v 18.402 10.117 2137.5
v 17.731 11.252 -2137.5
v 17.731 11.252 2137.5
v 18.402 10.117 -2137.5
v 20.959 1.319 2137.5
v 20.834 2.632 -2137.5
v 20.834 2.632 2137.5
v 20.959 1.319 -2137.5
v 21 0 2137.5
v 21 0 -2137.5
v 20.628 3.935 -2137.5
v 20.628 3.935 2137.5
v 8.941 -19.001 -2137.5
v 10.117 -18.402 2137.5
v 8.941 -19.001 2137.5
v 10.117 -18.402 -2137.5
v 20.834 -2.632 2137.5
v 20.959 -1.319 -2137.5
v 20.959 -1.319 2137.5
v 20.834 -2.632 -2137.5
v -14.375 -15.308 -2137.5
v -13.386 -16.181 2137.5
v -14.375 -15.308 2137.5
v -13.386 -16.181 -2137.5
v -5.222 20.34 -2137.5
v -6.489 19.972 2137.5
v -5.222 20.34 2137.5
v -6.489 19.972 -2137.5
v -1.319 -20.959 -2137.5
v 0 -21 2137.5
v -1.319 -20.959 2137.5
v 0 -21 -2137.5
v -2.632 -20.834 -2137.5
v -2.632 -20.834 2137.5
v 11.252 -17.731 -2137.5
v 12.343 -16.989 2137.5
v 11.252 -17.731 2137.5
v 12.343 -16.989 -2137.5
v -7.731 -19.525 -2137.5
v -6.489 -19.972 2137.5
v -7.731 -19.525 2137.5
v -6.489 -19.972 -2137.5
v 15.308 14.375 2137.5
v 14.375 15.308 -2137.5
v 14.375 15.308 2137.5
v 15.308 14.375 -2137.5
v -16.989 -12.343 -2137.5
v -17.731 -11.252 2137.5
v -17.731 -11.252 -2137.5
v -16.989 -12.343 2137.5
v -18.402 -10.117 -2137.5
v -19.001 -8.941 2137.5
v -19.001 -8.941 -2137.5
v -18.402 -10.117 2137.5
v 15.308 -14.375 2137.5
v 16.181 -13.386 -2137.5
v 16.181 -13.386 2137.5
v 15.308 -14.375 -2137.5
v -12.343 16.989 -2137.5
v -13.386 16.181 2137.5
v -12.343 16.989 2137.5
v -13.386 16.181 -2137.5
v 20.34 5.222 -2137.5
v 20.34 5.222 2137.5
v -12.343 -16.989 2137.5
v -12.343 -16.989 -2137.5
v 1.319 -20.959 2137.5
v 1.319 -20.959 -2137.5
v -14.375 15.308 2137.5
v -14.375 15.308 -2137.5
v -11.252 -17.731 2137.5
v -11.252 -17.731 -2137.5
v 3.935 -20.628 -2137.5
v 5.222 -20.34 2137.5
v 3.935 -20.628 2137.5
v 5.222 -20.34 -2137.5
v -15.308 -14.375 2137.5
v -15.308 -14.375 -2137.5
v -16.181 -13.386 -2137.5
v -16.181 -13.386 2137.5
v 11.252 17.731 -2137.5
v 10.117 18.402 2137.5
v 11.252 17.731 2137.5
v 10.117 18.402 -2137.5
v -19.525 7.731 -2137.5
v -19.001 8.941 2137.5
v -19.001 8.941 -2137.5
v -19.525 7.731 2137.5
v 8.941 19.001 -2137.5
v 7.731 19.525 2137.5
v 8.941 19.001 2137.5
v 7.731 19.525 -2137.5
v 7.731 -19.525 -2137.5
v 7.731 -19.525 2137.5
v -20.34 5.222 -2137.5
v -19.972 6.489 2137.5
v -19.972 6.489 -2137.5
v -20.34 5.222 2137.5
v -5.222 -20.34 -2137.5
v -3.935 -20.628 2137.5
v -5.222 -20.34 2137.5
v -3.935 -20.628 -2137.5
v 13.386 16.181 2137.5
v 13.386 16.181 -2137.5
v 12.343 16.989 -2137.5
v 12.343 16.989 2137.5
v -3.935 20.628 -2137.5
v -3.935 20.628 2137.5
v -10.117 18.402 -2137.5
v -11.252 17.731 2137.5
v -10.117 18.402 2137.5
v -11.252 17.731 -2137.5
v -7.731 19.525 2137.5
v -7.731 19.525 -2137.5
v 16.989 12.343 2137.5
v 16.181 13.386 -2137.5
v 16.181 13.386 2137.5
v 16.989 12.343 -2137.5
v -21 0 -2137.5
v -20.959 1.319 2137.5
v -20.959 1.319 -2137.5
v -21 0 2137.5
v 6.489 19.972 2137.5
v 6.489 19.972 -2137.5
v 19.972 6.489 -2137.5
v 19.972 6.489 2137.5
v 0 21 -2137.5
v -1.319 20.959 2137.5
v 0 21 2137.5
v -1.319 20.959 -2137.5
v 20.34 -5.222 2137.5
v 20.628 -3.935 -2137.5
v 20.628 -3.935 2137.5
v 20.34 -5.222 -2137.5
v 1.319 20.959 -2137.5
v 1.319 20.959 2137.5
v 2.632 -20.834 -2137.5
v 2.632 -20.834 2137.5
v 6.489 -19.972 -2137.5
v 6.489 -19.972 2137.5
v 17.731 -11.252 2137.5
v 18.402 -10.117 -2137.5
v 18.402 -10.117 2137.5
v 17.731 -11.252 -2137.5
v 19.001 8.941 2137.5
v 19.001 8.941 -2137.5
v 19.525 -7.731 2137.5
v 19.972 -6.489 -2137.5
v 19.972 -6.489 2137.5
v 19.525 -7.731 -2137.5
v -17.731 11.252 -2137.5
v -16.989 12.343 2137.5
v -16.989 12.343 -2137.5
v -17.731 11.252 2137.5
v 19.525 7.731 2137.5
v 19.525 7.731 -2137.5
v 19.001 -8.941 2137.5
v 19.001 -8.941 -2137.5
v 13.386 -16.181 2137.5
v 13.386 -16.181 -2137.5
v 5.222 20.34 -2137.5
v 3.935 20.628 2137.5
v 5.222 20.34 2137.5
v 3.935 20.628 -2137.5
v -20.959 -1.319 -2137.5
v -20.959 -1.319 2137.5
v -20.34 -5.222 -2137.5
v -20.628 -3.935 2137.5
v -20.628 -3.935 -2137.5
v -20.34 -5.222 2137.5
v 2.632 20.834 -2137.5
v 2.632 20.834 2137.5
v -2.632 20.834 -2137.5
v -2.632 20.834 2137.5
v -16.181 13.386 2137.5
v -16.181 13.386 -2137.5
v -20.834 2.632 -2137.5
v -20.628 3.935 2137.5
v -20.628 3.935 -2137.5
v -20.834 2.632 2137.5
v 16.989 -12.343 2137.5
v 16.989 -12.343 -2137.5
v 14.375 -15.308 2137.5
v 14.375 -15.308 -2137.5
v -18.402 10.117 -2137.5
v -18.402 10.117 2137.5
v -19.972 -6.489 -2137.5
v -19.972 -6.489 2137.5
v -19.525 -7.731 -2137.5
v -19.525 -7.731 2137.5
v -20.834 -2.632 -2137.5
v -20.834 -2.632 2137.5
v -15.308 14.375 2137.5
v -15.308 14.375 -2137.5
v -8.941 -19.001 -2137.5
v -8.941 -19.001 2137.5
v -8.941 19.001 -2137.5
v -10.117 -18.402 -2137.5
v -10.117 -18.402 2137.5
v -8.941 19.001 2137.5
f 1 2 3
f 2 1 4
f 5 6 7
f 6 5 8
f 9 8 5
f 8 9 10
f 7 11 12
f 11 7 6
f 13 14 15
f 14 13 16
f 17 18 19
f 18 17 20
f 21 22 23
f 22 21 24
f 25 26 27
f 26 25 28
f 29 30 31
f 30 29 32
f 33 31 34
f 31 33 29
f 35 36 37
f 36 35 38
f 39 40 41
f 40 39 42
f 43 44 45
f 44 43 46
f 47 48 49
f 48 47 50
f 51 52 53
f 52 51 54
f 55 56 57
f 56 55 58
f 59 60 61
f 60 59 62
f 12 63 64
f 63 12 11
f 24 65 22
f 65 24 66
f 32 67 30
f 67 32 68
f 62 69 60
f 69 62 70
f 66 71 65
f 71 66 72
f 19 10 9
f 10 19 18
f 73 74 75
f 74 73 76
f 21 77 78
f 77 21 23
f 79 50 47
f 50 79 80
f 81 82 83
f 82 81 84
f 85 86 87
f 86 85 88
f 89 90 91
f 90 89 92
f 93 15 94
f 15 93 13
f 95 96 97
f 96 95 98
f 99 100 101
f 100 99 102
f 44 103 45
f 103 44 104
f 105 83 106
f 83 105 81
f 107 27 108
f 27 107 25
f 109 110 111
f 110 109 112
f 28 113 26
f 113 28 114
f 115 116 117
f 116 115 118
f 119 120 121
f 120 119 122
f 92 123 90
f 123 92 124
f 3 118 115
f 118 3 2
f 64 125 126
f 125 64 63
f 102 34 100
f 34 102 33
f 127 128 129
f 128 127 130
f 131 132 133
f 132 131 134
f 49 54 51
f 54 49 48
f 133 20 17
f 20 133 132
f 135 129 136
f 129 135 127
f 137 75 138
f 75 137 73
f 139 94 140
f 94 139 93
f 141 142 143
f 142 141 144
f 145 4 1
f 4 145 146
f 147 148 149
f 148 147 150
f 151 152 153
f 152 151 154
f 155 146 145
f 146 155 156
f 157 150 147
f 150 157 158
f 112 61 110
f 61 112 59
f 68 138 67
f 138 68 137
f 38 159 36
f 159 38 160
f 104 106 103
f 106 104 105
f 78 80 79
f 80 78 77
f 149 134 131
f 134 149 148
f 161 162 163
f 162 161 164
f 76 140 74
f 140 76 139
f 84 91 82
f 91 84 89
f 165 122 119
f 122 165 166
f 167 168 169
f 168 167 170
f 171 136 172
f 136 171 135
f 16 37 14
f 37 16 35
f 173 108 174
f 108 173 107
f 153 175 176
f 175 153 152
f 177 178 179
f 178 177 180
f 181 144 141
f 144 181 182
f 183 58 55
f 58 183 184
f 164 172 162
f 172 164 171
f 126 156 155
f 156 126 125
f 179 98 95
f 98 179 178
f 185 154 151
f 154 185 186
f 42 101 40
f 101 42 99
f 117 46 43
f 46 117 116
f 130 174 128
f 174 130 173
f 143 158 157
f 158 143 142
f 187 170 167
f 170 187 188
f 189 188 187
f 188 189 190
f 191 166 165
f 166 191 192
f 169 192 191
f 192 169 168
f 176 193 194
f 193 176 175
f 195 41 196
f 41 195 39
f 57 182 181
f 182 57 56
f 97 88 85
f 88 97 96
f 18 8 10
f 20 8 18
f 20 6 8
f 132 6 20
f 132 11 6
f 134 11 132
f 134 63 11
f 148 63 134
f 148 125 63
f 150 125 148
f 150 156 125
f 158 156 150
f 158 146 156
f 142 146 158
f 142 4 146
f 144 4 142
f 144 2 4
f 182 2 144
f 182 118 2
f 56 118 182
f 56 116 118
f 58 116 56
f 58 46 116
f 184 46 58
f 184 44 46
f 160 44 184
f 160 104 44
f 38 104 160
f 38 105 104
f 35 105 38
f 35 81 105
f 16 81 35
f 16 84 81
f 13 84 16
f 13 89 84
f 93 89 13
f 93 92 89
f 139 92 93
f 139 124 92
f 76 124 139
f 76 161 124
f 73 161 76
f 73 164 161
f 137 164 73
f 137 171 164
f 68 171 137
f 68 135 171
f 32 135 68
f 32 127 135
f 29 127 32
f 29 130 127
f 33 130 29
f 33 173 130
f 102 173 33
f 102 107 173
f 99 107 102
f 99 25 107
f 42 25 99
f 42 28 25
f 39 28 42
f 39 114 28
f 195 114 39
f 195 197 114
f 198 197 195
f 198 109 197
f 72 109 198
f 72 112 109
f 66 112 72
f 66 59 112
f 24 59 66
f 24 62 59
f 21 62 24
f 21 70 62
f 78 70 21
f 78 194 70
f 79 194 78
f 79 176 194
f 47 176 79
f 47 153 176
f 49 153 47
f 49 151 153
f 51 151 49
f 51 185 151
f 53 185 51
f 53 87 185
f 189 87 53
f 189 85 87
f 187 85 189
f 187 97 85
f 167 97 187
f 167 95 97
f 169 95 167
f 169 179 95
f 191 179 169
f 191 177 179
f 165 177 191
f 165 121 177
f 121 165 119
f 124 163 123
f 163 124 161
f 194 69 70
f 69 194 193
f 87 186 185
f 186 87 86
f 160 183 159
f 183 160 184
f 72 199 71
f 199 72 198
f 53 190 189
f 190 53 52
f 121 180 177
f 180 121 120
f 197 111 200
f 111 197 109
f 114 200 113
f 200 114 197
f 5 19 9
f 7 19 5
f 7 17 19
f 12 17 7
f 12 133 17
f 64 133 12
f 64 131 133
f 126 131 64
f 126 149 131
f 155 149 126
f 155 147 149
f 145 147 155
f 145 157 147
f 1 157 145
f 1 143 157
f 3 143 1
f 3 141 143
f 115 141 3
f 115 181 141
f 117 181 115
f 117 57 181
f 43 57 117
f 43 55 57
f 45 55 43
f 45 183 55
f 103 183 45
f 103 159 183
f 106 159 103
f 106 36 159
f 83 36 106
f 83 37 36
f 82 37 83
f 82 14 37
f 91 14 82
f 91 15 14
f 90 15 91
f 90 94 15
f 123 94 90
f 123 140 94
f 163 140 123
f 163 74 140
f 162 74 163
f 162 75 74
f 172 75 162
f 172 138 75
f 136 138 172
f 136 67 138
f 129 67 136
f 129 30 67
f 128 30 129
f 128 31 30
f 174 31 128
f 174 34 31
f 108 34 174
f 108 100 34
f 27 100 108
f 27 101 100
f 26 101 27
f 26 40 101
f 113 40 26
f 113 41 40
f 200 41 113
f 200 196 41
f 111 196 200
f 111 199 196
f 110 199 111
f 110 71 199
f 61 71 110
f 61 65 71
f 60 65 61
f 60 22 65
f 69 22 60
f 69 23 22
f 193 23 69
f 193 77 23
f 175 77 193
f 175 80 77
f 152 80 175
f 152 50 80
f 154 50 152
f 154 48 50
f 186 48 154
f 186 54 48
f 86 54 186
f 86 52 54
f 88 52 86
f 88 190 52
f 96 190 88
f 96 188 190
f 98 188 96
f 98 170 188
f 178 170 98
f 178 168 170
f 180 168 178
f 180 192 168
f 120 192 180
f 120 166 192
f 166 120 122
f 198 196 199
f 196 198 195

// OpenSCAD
// ============================================================================
// PROJECT: XXXG-00W0 WING GUNDAM ZERO EW - AIRFRAME STRUCTURAL RE-ZONING
// COMPONENT VAULT: RUNNER F (PARTS F5 & F6) - THIGH FRAME INNER REINFORCEMENTS
// PACKAGING CONFIG: MULTI-LEVEL SUB-ARMOR CAPACITOR STORAGE RECESS SLOTS
// ELECTRICAL PARITY: ZERO-RESISTOR REGENERATIVE DISCHARGE TAKEOFF RETROFITS
// ============================================================================

$fn = 100; // Circular fragment rendering resolution count

// Structural Scaling Parameters (1:1 Dimensions for a 16.7m Mecha Architecture)
thigh_rib_length = 2850;                // Total longitudinal thigh core height (mm)
thigh_inner_diameter = 640;             // Internal skeletal framework core bore (mm)
titanium_bone_wall = 55;                // Solid TiAl interior structural wall gauge (mm)
harness_conduit_width = 80;             // Cast-in 4oz copper logic trace track (mm)
capacitor_pocket_depth = 15;            // Sub-armor recessed housing pocket depth (mm)
capacitor_pocket_width = 140;           // Transverse MLCC array pocket width (mm)

module Runner_F_Thigh_Rib_Forge() {
    // Central Supply Injection Runner Axis (Molten Feed Line from Siphon Forge)
    color([0.22, 0.22, 0.24]) {
        cylinder(h = thigh_rib_length * 1.5, d = 42, center = true);
        translate() rotate() cylinder(h = 500, d = 22);
        translate([0, 0, -800]) rotate() cylinder(h = 500, d = 22);
    }
    
    // Instantiate Scaled Skeutomorphic Part Molds Symmetrically
    Cast_Internal_Thigh_Ribs();
}

module Cast_Internal_Thigh_Ribs() {
    // ---- PART F5: INTERNAL LEFT THIGH STRUCTURAL REINFORCEMENT RIB ---- [Page 13, Step 6-1]
    translate([-450, 0, 600]) color([0.45, 0.45, 0.48]) { // Inner Frame Dark Spec
        difference() {
            // Main solid internal bone backbone column
            cube([340, 340, thigh_rib_length * 0.45], center = true);
            
            // Core Internal Structural Clearance (Bores out weight while leaving 55mm walls)
            cylinder(h = thigh_rib_length, d = thigh_inner_diameter, center = true);
            
            // SUB-ARMOR RECESSED CAPACITOR POCKET MOUNTS [Segmented rows cut inside the frame walls]
            for (z_offset = [-400, 0, 400]) {
                translate([0, (thigh_inner_diameter/2 - titanium_bone_wall + capacitor_pocket_depth/2), z_offset])
                    cube([capacitor_pocket_width, capacitor_pocket_depth, 140], center = true);
            }
            
            // Continuous cast-in routing track for the 4oz solid-state wiring rails
            cube([harness_conduit_width, 360, thigh_rib_length], center = true);
        }
    }
    
    // ---- PART F6: INTERNAL RIGHT THIGH STRUCTURAL REINFORCEMENT RIB ---- [Page 13, Step 6-1]
    translate([450, 0, -600]) rotate() color([0.45, 0.45, 0.48]) {
        difference() {
            cube([340, 340, thigh_rib_length * 0.45], center = true);
            cylinder(h = thigh_rib_length, d = thigh_inner_diameter, center = true);
            
            for (z_offset = [-400, 0, 400]) {
                translate([0, (thigh_inner_diameter/2 - titanium_bone_wall + capacitor_pocket_depth/2), z_offset])
                    cube([capacitor_pocket_width, capacitor_pocket_depth, 140], center = true);
            }
            
            cube([harness_conduit_width, 360, thigh_rib_length], center = true);
        }
    }
}

// Render Master Assembly to Parameter Workspace
Runner_F_Thigh_Rib_Forge();
